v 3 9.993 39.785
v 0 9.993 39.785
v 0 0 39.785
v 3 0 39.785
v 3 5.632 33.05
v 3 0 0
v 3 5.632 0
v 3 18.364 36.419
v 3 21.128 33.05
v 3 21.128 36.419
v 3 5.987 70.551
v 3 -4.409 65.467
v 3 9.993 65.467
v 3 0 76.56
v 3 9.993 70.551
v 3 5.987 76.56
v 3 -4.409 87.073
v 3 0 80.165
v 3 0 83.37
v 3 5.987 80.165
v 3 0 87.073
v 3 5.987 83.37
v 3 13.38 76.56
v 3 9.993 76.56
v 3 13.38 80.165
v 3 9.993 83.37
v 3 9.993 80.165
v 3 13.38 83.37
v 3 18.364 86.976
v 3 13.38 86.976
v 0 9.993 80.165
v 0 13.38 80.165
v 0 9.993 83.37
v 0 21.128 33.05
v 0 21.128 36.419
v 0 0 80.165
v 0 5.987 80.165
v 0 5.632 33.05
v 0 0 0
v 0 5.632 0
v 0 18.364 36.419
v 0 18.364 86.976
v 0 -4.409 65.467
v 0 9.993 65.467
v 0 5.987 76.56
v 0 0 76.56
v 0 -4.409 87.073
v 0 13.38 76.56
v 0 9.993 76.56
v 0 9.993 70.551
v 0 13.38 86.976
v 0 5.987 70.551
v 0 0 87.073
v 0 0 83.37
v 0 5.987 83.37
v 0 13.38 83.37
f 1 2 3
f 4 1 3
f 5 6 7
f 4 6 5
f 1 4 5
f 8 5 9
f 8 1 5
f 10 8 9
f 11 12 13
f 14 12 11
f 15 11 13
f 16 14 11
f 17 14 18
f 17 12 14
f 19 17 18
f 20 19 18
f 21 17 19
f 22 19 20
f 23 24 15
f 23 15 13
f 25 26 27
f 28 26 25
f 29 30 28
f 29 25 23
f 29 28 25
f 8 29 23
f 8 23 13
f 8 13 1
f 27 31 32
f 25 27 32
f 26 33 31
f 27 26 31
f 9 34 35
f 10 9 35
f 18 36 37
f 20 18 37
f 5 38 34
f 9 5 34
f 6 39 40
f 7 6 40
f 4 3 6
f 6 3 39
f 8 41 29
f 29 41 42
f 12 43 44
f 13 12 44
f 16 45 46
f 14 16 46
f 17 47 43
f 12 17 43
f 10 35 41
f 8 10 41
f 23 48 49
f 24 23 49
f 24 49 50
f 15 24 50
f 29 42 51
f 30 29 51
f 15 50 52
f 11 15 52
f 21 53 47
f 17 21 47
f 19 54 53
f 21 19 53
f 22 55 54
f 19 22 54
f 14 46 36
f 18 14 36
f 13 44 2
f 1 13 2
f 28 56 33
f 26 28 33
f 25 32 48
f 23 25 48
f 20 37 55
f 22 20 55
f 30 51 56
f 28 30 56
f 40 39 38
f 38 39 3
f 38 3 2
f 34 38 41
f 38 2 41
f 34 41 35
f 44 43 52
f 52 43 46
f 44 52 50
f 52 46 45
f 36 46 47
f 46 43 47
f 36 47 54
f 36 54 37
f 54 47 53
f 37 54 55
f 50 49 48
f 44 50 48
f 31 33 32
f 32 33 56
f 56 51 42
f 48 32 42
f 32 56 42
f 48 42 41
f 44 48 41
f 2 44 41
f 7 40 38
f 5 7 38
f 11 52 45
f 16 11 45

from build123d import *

# Parameters (mm, degrees)
F1_DEPTH = 3


with BuildPart() as f1:
    # F0 (on Right) → F1 (new body)
    with BuildSketch(Plane.YZ):
        Polygon((0, 39.784912), (0, 0), (5.631864, 0), (5.631864, 33.050187), (21.127917, 33.050187), (21.127917, 36.418896), (18.364444, 36.418896), (18.364444, 86.97556), (13.37989, 86.97556), (13.37989, 83.370075), (9.992642, 83.370075), (9.992642, 80.1652), (13.37989, 80.1652), (13.37989, 76.559722), (9.992642, 76.559722), (9.992642, 70.550583), (5.986553, 70.550583), (5.986553, 76.559722), (0, 76.559722), (0, 80.1652), (5.986553, 80.1652), (5.986553, 83.370075), (0, 83.370075), (0, 87.072618), (-4.40907, 87.072618), (-4.40907, 65.46703), (9.992642, 65.46703), (9.992642, 39.784912), align=None)
    extrude(amount=F1_DEPTH)


solid = f1.part
